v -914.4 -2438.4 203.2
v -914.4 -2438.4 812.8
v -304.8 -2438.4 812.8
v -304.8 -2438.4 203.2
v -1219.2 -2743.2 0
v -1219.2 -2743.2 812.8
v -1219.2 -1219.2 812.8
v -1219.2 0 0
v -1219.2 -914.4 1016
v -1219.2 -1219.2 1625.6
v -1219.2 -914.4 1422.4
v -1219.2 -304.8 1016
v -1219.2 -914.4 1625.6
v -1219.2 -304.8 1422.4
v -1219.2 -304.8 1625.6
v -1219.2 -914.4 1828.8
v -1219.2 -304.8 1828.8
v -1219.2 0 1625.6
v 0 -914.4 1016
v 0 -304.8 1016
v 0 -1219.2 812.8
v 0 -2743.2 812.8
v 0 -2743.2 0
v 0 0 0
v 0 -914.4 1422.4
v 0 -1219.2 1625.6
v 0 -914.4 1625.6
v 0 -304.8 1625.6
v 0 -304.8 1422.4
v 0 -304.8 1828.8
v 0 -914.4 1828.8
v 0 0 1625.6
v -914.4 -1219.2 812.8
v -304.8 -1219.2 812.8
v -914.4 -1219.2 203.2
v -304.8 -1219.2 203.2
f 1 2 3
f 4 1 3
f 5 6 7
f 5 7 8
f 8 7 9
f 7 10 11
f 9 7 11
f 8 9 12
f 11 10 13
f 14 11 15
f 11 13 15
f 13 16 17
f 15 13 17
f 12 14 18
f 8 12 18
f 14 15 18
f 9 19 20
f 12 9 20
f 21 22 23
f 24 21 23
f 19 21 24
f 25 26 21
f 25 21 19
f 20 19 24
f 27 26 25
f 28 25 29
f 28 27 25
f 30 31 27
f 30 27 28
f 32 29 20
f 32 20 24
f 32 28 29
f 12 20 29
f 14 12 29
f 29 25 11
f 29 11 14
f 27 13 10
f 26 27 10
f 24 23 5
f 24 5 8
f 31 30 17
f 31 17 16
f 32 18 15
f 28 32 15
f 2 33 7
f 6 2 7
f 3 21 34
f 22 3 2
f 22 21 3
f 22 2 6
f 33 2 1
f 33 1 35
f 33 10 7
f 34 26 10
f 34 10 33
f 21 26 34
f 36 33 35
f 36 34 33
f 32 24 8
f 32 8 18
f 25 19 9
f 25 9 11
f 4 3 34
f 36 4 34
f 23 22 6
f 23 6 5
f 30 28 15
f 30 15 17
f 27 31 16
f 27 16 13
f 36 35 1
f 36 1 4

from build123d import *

# Parameters (mm, degrees)
F0_W     = 609.6
F0_H     = 406.4
F1_DEPTH = 1219.2
F2_W     = 609.6
F2_H     = 1219.2
F3_DEPTH = 609.6


with BuildPart() as f1:
    # F0 (on Right) → F1 (new body)
    with BuildSketch(Plane.YZ):
        Polygon((-2743.2, 0), (0, 0), (0, 1625.6), (-304.8, 1625.6), (-304.8, 1828.8), (-914.4, 1828.8), (-914.4, 1625.6), (-1219.2, 1625.6), (-1219.2, 812.8), (-2743.2, 812.8), align=None)
        with Locations((-609.6, 1219.2)):
            Rectangle(F0_W, F0_H, mode=Mode.SUBTRACT)
    extrude(amount=-F1_DEPTH)

    # F2 (on face) → F3 (cut)
    with BuildSketch(Plane.XY.offset(812.8)):
        with Locations((-609.6, -1828.8)):
            Rectangle(F2_W, F2_H)
    extrude(amount=-F3_DEPTH, mode=Mode.SUBTRACT)


solid = f1.part
